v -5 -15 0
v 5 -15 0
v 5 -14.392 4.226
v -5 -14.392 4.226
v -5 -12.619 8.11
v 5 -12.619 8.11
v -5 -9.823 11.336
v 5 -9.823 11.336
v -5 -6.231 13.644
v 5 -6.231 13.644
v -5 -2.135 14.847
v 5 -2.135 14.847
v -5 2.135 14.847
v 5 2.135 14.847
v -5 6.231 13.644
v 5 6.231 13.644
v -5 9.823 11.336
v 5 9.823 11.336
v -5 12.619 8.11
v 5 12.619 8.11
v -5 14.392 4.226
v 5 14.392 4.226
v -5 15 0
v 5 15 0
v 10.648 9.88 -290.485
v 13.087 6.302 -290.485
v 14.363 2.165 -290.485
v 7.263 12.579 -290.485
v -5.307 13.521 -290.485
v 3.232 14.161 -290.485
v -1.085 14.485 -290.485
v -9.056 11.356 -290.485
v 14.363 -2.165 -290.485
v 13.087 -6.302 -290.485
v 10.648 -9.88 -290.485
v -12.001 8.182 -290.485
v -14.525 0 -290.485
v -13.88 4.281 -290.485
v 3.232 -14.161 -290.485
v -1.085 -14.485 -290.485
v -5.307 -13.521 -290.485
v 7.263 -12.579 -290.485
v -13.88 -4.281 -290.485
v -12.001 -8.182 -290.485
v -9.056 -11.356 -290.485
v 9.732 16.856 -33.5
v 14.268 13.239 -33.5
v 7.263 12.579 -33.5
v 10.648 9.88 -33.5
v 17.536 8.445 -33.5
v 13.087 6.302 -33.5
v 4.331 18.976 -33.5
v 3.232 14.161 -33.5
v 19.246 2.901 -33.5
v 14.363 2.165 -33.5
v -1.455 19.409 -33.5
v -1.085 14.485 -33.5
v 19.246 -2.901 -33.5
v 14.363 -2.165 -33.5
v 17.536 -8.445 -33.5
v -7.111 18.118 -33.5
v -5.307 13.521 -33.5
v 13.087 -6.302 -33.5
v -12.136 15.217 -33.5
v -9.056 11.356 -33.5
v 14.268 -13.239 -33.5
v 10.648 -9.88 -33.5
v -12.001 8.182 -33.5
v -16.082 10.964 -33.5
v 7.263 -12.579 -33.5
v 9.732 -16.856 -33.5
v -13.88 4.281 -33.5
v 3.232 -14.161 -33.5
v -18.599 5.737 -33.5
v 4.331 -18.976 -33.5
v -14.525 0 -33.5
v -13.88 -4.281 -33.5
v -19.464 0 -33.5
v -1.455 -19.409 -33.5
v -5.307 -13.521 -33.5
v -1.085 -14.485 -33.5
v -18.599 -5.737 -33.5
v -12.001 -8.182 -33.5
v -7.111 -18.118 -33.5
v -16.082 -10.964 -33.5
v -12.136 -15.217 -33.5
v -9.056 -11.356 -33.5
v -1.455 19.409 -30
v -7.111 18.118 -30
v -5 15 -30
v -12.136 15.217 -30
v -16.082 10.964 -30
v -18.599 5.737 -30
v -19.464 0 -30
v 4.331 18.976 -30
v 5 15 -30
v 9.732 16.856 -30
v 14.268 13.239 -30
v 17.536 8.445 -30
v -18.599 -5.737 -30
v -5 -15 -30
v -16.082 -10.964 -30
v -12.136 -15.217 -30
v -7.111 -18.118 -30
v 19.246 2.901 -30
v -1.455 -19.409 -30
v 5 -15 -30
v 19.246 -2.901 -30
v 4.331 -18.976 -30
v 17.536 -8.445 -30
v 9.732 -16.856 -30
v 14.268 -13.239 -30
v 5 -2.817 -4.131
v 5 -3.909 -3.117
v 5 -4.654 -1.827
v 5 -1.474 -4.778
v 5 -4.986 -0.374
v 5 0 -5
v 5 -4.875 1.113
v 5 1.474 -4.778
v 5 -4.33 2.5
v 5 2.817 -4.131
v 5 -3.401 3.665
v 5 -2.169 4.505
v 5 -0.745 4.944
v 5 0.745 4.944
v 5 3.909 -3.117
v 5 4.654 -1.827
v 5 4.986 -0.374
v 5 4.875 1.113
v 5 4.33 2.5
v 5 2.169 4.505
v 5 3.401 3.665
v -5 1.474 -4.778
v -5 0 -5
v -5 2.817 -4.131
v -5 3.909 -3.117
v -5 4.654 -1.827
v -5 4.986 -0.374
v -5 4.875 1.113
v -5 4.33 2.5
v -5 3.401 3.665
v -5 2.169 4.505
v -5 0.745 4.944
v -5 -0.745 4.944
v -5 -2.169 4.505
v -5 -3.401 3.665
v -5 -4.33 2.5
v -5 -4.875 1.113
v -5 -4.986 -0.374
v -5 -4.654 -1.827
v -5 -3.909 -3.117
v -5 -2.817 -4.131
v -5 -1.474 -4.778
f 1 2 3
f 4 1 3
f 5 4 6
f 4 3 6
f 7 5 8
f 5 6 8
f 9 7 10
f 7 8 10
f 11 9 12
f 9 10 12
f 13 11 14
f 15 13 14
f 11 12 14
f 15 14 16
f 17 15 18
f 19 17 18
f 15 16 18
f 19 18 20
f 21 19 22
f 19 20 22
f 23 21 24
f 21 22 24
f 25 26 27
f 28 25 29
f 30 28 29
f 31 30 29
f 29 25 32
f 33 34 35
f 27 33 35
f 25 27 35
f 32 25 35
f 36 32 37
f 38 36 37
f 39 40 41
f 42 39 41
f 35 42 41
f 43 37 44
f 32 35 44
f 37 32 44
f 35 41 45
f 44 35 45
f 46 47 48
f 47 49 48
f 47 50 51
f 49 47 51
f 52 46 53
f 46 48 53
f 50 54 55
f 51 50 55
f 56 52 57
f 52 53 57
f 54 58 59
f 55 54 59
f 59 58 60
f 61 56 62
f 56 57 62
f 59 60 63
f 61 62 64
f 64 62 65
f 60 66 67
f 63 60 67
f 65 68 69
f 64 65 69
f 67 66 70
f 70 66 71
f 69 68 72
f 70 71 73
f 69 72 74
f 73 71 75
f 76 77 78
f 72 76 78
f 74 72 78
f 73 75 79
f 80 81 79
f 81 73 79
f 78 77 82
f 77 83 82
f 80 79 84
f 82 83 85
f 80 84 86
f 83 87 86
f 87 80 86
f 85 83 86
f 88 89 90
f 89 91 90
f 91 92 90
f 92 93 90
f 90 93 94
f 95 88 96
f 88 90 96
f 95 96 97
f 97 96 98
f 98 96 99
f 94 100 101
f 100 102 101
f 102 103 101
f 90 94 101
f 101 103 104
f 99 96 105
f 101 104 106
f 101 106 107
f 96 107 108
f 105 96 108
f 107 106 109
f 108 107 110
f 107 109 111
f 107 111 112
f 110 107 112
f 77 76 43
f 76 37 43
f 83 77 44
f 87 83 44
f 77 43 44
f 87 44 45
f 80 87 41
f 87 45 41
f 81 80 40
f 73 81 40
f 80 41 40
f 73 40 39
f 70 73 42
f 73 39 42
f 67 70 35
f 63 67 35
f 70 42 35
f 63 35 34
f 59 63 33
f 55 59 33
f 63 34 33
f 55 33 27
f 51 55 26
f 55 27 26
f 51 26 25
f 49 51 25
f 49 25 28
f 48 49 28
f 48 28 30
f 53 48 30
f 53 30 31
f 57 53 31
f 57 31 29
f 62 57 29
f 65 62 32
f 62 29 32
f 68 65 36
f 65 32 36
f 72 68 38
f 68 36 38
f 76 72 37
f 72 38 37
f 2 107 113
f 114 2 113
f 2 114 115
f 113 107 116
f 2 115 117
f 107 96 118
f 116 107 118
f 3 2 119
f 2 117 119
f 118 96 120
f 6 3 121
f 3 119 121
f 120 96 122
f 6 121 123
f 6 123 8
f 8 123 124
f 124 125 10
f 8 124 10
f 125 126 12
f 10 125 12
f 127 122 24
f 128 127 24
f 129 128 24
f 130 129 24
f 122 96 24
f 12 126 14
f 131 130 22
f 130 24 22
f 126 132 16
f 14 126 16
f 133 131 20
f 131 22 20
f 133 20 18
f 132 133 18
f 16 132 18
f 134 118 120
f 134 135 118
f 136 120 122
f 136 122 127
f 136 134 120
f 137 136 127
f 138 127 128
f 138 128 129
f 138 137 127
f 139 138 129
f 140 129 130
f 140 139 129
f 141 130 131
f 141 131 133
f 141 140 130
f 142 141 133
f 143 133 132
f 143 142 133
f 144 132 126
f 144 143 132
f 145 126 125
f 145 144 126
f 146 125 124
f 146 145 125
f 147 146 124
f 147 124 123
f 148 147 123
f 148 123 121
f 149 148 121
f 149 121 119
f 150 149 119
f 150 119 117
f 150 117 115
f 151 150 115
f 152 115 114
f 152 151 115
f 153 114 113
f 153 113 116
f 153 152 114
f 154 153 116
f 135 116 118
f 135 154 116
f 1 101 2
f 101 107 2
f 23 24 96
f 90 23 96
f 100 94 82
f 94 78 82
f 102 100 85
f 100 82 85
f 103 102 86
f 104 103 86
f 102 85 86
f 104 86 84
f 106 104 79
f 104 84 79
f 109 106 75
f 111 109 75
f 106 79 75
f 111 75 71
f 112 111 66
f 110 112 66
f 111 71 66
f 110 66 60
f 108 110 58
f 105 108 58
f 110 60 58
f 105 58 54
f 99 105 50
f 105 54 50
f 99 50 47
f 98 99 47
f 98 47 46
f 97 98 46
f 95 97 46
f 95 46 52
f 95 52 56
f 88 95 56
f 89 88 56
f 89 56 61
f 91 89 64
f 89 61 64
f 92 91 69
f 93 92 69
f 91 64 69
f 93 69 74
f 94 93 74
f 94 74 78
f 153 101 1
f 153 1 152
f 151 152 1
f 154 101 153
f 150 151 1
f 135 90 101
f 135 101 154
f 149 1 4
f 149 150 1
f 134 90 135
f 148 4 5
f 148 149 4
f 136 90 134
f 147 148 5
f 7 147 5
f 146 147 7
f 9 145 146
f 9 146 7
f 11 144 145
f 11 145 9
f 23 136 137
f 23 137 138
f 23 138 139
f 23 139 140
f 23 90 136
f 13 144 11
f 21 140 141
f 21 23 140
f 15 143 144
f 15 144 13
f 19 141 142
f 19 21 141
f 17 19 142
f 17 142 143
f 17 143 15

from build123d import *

# Parameters (mm, degrees)
SKETCH1_R           = 5
BOSS_EXTRUDE1_DEPTH = 5


with BuildPart() as part:
    # Sketch1 → Boss-Extrude1 (new, symmetric)
    with BuildSketch(Plane(origin=(0, 0, 0), x_dir=(0, 0, -1), z_dir=(1, 0, 0))):
        with BuildLine():
            Line((0, 15), (30, 15))
            Line((30, 15), (30, -15))
            Line((30, -15), (0, -15))
            ThreePointArc((0, -15), (-15, 0), (0, 15))
        make_face()
        Circle(SKETCH1_R, mode=Mode.SUBTRACT)
    extrude(amount=BOSS_EXTRUDE1_DEPTH, both=True)

    # Sketch2 → Revolve1 (revolve)
    with BuildSketch(Plane(origin=(0, 0, 0), x_dir=(0, 0, -1), z_dir=(1, 0, 0)), mode=Mode.PRIVATE) as revolve1_sk:
        Polygon((30, 0), (30, 19.46387593), (33.500252175, 19.46387593), (33.500252175, 14.525280545), (290.484846339, 14.525280545), (290.484846339, 0), align=None)
    revolve(revolve1_sk.sketch.rotate(Axis((0, 0, -290.484846339), (0, 0, 1)), 90), axis=Axis((0, 0, -290.484846339), (0, 0, 1)))


solid = part.part
